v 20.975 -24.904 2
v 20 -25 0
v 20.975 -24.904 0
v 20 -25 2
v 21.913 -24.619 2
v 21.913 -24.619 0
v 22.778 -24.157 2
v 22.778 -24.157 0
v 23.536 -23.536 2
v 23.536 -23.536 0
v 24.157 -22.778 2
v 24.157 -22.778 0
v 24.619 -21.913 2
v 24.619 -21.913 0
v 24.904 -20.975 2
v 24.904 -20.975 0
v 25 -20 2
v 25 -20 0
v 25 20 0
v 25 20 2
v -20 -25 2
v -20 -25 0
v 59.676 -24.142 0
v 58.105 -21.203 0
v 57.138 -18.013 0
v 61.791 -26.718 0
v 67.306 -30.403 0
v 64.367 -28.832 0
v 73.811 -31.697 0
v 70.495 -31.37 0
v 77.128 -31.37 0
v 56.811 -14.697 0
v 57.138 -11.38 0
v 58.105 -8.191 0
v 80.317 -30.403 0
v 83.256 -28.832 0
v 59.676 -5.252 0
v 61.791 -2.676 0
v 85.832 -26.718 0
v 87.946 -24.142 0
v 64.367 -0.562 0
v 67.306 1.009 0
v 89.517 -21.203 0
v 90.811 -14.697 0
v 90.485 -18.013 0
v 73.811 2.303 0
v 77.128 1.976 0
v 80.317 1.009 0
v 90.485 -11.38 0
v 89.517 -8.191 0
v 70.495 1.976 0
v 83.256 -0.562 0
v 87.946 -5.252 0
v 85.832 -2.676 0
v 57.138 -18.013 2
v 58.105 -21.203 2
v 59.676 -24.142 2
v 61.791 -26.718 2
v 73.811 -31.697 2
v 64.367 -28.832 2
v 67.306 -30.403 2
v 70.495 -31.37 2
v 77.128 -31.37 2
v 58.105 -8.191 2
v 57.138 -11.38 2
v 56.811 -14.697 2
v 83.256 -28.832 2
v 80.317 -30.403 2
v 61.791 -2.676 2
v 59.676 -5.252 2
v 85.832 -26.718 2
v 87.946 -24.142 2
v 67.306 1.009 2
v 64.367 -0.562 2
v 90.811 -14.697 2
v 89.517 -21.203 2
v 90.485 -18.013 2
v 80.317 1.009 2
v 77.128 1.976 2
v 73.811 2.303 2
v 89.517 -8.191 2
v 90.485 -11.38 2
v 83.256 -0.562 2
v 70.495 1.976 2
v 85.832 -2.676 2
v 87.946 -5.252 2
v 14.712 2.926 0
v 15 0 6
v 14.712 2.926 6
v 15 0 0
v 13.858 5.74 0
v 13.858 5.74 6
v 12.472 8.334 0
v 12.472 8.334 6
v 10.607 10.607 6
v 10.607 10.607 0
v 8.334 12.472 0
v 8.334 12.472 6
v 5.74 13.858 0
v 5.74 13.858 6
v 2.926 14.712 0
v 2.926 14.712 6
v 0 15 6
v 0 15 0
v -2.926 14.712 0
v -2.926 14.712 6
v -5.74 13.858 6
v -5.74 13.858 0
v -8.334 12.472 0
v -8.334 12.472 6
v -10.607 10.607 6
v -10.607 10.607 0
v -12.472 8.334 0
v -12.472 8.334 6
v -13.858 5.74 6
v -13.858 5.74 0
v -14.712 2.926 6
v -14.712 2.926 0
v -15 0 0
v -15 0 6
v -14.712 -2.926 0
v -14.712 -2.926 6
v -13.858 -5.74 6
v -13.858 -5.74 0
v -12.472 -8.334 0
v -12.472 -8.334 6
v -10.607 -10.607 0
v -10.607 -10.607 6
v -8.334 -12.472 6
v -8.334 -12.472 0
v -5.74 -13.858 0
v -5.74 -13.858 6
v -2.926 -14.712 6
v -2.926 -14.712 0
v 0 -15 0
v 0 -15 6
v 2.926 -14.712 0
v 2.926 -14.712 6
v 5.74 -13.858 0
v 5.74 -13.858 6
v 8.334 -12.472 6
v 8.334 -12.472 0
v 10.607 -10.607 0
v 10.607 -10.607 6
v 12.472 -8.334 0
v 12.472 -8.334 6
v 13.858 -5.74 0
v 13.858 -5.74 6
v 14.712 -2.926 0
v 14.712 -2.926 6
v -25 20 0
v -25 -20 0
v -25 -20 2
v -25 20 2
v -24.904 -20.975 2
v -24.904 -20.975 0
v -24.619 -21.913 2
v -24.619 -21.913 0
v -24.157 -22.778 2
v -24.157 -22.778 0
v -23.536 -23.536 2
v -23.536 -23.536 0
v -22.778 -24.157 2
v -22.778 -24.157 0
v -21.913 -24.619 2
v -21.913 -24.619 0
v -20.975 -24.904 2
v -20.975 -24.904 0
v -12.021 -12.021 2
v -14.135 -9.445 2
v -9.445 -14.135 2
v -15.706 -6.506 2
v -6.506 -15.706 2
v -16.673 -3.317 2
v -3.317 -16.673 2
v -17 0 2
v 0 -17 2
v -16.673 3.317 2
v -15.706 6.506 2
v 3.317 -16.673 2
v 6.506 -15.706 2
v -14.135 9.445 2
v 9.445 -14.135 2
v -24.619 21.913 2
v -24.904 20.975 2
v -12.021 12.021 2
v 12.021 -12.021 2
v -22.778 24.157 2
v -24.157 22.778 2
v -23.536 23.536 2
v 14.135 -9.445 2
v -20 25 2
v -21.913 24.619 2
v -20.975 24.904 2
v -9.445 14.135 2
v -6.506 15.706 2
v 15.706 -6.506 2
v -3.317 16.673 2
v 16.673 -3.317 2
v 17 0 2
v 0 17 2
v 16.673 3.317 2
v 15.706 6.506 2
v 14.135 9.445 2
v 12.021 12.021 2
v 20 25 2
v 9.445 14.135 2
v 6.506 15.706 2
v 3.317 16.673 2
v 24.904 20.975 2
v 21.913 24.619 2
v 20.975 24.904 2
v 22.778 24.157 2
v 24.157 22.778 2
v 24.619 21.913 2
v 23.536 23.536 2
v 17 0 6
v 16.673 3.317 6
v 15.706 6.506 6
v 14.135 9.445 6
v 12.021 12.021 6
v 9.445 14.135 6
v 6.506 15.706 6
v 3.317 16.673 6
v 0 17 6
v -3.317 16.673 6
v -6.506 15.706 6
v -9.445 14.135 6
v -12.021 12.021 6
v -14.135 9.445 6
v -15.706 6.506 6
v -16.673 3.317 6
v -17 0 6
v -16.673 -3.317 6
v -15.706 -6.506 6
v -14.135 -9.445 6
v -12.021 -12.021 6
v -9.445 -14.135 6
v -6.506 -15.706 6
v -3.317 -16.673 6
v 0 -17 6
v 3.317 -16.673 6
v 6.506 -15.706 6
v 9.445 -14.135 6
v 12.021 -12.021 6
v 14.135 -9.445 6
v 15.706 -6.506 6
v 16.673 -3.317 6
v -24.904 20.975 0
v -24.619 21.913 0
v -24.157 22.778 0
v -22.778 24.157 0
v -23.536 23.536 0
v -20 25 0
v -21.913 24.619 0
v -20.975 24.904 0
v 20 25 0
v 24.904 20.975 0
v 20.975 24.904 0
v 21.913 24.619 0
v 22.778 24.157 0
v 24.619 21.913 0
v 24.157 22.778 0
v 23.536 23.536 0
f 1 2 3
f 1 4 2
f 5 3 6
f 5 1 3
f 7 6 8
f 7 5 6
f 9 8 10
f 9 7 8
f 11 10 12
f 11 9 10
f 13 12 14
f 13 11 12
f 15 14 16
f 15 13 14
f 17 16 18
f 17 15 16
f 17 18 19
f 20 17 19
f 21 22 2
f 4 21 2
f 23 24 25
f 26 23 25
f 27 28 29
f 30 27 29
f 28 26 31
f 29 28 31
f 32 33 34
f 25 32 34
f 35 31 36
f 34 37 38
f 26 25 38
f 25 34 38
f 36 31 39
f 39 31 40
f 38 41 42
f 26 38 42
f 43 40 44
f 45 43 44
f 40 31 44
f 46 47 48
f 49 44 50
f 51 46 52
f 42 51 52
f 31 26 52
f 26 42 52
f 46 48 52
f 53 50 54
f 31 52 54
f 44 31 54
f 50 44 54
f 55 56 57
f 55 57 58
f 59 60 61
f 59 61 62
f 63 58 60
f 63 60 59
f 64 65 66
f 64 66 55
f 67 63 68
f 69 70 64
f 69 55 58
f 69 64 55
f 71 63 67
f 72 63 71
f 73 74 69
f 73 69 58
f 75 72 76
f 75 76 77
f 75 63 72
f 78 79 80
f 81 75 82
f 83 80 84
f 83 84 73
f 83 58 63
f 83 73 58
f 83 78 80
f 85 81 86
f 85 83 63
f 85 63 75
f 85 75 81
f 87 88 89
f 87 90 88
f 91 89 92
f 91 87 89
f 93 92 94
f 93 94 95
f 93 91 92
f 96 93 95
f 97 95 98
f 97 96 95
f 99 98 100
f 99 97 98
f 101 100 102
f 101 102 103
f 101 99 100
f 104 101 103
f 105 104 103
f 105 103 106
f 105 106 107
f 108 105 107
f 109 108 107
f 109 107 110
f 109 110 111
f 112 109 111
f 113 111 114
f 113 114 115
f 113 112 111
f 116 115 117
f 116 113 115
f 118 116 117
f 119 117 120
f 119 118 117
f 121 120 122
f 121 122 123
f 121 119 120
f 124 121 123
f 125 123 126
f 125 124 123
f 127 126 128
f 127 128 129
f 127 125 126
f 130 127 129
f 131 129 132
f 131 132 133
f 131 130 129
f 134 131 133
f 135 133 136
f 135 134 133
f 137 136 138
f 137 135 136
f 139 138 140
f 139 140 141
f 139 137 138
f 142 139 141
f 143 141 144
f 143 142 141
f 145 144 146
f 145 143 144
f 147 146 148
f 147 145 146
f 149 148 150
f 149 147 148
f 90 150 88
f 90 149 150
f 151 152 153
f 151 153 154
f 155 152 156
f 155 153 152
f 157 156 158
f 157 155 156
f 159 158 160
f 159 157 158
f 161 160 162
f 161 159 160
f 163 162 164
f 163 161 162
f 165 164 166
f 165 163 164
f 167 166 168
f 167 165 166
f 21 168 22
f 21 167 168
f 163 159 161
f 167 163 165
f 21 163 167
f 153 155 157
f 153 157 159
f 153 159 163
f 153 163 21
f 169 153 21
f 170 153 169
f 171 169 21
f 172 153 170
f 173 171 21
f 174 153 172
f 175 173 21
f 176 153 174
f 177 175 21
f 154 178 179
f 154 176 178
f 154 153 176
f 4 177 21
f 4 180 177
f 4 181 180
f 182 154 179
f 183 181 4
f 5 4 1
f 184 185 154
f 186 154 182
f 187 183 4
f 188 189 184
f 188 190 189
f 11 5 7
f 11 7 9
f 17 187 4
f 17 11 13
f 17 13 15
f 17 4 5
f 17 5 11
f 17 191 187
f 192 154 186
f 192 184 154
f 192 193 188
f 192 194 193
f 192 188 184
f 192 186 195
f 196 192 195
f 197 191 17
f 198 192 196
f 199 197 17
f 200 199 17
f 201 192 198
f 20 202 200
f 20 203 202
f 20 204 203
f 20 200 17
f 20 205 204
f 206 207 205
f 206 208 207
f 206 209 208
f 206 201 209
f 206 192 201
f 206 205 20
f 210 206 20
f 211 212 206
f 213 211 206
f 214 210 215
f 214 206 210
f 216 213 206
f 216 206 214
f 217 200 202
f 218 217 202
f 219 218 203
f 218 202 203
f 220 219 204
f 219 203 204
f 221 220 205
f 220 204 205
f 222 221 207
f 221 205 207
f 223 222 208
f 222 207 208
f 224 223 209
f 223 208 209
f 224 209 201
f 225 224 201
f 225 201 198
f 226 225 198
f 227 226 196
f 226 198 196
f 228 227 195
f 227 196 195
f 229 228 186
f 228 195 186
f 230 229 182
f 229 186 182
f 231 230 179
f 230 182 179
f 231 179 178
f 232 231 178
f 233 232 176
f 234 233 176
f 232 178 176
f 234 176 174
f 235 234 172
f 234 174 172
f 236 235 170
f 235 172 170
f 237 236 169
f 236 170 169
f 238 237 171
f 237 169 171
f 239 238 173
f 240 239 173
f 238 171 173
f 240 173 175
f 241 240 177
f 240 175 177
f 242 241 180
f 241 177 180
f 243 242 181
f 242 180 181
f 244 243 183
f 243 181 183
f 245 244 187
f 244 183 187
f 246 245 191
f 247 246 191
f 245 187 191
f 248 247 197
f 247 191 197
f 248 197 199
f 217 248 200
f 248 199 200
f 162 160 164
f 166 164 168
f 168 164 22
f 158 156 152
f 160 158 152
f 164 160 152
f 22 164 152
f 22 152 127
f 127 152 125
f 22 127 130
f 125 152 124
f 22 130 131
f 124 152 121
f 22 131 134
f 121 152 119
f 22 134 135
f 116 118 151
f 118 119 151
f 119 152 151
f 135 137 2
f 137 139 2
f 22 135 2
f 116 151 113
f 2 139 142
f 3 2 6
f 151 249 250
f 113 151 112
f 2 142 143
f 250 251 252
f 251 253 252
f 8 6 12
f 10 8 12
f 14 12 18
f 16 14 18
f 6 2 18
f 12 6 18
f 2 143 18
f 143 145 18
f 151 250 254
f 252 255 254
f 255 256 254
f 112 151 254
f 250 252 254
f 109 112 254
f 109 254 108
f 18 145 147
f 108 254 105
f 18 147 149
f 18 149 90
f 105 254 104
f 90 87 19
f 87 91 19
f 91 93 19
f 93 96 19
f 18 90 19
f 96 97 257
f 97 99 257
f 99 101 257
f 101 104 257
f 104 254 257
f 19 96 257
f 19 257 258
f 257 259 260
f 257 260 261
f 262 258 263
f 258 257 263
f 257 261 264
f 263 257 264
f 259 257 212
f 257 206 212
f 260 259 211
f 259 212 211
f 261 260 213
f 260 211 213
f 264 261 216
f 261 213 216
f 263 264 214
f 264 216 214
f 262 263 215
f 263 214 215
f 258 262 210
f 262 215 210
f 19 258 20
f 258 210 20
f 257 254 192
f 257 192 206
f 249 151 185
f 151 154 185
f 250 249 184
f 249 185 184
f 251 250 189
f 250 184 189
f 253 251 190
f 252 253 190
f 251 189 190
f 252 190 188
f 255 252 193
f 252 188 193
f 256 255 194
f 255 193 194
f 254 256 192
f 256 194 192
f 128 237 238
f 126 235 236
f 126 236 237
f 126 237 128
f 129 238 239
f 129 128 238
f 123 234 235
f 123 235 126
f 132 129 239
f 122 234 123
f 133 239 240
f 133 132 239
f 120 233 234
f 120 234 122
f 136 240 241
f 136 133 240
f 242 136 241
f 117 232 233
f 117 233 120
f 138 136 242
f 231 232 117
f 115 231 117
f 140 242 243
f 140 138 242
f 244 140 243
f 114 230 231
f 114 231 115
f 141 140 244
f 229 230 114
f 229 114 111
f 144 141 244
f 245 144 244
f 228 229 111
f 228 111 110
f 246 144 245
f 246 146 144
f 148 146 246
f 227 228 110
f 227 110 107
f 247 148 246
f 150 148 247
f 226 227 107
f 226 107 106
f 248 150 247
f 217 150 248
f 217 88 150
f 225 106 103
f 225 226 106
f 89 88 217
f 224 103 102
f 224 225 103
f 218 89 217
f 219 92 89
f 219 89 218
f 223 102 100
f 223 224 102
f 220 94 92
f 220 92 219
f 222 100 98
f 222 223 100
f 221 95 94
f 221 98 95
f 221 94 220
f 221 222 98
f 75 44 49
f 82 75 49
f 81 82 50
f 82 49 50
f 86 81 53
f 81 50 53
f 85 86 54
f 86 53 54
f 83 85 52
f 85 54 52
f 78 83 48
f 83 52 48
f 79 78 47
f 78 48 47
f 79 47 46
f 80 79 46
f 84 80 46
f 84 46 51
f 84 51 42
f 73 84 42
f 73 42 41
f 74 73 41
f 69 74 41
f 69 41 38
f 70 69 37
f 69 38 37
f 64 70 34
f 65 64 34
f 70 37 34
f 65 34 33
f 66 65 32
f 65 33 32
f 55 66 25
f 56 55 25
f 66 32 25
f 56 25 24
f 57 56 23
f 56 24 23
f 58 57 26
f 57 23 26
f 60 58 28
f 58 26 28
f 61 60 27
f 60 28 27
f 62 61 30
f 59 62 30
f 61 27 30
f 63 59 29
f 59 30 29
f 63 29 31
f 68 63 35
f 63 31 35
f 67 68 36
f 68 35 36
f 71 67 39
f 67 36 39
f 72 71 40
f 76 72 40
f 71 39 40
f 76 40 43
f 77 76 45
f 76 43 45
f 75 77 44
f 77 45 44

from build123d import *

# Parameters (mm, degrees)
F0_W     = 50
F0_H     = 50
F0_R     = 15
F0_R_2   = 17
F1_DEPTH = 2
F2_R     = 5
F3_R     = 17
F3_R_2   = 15
F4_DEPTH = 4


with BuildPart() as f1:
    # F0 (on Top) → F1 (new body)
    with BuildSketch(Plane.XY):
        Rectangle(F0_W, F0_H)
        Circle(F0_R, mode=Mode.SUBTRACT)
        with Locations((73.811419, -14.696962)):
            Circle(F0_R_2)
    extrude(amount=F1_DEPTH)

    # F2
    f2_edges = [f1.edges().sort_by_distance(p)[0] for p in [
        (25, -25, 1),
        (25, 25, 1),
        (-25, -25, 1),
        (-25, 25, 1),
    ]]
    fillet(f2_edges, radius=F2_R)

    # F3 (on face) → F4 (join)
    with BuildSketch(Plane.XY.offset(2)):
        Circle(F3_R)
        Circle(F3_R_2, mode=Mode.SUBTRACT)
    extrude(amount=F4_DEPTH)


solid = f1.part
